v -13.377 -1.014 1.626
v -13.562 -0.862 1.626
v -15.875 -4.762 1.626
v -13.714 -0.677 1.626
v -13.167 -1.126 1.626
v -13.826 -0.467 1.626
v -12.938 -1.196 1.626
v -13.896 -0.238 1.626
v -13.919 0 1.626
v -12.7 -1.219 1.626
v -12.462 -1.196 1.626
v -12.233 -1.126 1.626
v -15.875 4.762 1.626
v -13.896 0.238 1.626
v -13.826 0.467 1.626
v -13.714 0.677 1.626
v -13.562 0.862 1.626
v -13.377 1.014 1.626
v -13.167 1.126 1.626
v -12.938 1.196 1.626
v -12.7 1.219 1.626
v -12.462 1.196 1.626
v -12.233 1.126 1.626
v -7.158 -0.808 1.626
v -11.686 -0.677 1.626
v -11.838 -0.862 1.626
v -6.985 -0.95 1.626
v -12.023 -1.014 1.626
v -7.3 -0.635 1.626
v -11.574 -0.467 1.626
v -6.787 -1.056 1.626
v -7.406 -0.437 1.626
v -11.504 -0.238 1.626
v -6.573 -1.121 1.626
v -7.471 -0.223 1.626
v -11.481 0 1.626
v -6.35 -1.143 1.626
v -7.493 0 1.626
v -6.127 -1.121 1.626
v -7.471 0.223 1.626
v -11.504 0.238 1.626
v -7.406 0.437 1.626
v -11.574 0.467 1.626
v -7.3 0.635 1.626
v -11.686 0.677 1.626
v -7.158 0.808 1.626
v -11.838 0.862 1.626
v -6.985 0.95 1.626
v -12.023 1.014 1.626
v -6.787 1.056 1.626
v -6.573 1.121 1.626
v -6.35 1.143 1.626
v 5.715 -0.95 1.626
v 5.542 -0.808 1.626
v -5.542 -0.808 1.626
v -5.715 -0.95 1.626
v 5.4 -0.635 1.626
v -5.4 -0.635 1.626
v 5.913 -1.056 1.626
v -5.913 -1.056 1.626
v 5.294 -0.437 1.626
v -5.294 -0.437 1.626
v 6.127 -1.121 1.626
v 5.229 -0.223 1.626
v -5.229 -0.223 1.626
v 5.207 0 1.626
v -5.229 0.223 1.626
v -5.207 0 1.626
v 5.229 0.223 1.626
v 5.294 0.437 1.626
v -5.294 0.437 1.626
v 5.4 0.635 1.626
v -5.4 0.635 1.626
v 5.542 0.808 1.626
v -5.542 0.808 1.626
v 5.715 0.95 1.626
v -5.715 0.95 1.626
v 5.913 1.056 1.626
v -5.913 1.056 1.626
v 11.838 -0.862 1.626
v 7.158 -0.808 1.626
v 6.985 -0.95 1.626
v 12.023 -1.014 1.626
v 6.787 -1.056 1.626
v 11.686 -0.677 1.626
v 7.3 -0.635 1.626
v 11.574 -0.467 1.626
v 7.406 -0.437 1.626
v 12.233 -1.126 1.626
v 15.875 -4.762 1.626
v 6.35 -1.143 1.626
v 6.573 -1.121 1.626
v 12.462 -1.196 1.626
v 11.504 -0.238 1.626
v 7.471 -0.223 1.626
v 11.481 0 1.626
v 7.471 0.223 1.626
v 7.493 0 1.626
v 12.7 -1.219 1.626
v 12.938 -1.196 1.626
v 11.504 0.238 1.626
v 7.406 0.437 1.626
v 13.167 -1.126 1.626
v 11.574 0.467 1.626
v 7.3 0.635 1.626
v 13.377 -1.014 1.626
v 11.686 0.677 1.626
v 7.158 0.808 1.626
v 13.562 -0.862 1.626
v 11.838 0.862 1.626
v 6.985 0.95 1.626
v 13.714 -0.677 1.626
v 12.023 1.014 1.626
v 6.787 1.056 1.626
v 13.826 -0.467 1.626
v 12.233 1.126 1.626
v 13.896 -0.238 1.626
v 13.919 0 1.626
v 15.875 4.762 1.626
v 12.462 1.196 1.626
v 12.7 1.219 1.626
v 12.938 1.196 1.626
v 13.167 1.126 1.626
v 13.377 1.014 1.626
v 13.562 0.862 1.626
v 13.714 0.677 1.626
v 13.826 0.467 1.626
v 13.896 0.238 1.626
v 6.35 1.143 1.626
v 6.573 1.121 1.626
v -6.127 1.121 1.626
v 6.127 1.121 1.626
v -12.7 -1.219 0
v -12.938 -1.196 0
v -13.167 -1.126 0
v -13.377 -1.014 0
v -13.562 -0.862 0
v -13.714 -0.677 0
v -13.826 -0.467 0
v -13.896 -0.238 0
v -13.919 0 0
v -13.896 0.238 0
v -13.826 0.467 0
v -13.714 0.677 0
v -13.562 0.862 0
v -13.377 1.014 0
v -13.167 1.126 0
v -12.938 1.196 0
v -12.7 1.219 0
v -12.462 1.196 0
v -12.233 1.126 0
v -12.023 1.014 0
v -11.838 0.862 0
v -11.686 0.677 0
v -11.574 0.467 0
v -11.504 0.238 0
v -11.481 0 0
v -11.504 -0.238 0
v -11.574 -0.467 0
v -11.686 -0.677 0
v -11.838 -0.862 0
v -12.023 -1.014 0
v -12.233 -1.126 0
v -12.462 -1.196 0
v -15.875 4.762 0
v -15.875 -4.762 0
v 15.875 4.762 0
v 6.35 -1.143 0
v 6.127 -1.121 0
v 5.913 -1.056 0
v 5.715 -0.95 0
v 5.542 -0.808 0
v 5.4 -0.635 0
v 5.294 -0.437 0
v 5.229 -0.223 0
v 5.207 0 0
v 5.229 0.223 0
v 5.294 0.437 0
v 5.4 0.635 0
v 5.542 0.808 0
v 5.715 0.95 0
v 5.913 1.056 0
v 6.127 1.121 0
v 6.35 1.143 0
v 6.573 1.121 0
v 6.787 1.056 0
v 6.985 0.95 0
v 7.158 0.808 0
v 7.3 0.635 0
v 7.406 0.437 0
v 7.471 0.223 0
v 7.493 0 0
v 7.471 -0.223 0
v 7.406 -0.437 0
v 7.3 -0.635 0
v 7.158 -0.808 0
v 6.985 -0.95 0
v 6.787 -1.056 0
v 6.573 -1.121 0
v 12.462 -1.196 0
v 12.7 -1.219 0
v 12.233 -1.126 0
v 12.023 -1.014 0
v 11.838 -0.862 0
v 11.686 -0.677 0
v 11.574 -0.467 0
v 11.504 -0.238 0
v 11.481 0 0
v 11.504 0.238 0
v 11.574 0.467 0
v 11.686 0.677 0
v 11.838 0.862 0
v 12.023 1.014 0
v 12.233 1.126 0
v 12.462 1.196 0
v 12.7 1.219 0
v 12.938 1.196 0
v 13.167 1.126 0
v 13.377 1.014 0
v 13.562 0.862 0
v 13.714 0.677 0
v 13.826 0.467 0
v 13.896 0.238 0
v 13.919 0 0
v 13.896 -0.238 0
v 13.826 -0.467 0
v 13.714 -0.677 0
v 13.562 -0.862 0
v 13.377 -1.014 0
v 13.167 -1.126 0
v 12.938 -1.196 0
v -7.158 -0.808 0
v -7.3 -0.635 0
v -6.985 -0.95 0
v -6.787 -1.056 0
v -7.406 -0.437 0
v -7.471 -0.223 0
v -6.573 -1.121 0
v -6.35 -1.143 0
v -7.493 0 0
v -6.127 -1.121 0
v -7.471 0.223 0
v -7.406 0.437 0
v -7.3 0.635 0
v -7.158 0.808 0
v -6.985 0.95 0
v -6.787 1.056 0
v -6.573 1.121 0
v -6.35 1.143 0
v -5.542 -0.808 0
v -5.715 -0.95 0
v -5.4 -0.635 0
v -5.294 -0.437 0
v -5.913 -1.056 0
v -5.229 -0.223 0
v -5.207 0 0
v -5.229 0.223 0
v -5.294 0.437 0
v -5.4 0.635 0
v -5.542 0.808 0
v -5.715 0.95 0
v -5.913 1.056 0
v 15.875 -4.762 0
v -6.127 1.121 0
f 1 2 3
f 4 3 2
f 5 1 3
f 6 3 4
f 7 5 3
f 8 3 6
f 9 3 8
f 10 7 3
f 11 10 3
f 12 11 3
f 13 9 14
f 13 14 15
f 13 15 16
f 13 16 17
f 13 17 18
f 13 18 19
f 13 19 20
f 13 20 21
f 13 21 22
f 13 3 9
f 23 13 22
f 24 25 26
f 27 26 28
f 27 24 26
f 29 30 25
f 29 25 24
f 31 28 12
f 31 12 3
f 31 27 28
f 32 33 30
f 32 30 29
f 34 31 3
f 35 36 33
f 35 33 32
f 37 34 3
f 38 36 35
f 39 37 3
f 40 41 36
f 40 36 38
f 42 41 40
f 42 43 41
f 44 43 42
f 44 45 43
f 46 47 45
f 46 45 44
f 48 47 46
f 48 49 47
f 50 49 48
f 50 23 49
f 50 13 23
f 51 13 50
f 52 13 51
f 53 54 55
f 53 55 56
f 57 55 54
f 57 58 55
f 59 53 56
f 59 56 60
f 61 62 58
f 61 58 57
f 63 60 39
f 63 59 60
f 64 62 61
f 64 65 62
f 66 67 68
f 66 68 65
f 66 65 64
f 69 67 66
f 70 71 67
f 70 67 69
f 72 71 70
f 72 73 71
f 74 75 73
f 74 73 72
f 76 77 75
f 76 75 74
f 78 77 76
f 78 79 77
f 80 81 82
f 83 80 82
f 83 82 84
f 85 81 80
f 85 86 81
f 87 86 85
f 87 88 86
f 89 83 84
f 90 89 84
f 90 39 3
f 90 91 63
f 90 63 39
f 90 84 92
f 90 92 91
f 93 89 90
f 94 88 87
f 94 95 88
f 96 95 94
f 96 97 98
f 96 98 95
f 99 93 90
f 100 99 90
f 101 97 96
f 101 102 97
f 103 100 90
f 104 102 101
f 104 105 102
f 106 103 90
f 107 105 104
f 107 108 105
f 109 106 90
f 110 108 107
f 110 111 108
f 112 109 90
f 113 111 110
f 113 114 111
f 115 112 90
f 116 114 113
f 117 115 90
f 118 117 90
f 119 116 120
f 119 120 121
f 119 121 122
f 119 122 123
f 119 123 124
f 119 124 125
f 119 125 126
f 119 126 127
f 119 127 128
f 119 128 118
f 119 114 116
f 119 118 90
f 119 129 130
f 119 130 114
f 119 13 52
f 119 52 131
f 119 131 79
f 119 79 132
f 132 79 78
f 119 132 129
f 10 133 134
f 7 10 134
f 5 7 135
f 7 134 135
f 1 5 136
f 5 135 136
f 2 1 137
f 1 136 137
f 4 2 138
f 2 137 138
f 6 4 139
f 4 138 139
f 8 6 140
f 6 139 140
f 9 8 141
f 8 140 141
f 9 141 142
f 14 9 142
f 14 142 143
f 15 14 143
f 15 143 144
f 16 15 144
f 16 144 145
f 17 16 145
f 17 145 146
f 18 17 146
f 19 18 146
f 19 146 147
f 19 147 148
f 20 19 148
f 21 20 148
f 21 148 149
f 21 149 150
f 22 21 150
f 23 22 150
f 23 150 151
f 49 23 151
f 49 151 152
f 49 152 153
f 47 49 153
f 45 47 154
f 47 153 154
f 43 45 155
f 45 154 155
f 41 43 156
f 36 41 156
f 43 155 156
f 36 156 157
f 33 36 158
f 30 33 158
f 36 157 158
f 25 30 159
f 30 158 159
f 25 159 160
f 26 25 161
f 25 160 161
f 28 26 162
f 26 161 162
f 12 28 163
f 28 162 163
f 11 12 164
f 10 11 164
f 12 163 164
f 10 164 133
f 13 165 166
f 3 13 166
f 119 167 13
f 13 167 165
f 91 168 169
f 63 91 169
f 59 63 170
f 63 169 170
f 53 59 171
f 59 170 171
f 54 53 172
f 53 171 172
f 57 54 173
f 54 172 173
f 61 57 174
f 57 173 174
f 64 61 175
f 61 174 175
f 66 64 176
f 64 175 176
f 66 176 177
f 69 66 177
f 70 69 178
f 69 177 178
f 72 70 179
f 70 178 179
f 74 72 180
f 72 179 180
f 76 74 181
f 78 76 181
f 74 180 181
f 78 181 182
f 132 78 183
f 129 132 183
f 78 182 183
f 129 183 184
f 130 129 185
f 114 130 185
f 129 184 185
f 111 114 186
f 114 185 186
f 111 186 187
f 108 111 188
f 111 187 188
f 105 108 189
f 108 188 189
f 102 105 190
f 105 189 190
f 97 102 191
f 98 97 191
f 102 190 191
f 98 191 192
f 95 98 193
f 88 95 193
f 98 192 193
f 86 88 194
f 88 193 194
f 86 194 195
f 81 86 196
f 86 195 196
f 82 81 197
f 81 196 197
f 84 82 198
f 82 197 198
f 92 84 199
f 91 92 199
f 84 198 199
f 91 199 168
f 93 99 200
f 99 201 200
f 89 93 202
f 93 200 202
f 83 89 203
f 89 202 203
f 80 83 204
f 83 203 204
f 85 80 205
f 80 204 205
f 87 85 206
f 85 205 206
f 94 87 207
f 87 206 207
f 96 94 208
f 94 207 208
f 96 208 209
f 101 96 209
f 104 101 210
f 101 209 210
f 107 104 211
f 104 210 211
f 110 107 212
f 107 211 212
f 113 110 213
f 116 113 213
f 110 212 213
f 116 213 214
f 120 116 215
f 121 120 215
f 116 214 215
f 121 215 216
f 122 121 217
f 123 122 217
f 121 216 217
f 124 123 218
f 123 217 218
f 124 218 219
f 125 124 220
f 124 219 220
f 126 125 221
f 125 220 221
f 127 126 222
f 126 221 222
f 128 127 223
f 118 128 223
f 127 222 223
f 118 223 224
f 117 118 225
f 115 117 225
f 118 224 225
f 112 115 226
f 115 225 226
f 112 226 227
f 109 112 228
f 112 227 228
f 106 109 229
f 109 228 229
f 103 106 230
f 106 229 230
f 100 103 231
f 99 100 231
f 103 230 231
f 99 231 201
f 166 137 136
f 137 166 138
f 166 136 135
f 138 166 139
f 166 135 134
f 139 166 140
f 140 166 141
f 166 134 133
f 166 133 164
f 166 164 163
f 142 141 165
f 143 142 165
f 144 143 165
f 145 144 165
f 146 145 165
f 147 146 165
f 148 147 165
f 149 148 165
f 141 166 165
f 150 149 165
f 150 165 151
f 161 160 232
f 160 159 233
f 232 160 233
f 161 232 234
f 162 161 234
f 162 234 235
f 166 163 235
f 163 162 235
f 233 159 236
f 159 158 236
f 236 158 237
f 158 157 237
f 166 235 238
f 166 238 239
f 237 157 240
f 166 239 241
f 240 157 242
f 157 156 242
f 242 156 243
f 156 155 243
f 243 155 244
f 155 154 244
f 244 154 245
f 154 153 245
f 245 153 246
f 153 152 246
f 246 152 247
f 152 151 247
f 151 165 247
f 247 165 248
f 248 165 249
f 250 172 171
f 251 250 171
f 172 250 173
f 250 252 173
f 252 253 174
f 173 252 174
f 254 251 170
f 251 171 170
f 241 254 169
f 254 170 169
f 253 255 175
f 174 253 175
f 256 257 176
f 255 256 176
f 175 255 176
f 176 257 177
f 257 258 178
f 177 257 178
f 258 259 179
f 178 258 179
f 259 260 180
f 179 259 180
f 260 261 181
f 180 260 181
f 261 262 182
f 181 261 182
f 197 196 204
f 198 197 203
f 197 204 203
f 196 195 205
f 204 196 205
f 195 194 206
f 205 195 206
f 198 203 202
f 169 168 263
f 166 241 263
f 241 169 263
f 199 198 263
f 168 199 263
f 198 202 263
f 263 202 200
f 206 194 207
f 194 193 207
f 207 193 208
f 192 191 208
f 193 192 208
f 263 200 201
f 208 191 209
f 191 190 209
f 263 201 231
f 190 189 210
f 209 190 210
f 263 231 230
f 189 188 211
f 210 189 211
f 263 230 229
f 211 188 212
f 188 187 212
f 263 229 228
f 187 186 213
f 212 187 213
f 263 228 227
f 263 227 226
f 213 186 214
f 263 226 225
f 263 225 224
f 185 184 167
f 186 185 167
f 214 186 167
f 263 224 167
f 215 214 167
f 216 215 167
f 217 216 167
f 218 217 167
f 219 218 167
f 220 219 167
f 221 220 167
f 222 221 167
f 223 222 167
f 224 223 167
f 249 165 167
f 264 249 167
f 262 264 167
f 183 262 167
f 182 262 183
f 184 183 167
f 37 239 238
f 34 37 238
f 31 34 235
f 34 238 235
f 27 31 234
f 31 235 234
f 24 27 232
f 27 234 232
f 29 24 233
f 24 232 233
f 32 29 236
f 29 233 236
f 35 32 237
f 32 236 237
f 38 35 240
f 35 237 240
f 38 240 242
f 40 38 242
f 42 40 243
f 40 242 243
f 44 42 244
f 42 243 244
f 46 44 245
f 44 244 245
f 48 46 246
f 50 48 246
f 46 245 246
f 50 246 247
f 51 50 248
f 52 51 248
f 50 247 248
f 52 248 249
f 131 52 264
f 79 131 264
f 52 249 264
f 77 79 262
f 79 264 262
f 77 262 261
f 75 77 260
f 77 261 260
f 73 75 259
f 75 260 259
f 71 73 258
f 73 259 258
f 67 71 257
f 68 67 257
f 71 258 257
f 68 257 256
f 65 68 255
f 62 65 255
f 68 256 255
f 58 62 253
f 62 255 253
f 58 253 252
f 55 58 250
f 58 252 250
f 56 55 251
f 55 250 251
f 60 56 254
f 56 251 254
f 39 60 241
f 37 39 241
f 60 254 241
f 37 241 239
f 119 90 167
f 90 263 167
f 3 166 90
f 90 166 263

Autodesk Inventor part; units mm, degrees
ref_plane "YZ Plane" through (0, 0, 0) normal (1, 0, 0) x (0, 1, 0)
ref_plane "XZ Plane" through (0, 0, 0) normal (0, 1, 0) x (-1, 0, 0)
ref_plane "XY Plane" through (0, 0, 0) normal (0, 0, 1) x (1, 0, 0)
sketch "Sketch1" plane through (0, 0, 0) normal (0, 0, 1) x (1, 0, 0)
  line L0 (-15.875, -4.7625) -> (15.875, -4.7625)
  line L1 (15.875, -4.7625) -> (15.875, 4.7625)
  line L2 (15.875, 4.7625) -> (-15.875, 4.7625)
  line L3 (-15.875, 4.7625) -> (-15.875, -4.7625)
  line L4 (-15.875, -4.7625) -> (15.875, 4.7625) construction
  point P0 (0, 0)
  point P1 (0, 0)
  dimension "d0" = 9.525
  dimension "d1" = 31.75
extrude "Extrusion1" add sketch "Sketch1" along normal blind 1.6256
sketch "Sketch2" plane through (0, 0, 1.6256) normal (0, 0, 1) x (1, 0, 0)
  line L0 (-22.225, 0) -> (22.225, 0) construction
  line L1 (0, -6.6675) -> (0, 6.6675) construction
  point P0 (0, 0)
  point P1 (-12.7, 0)
  point P2 (12.7, 0)
  dimension "d4" = 25.4
hole "Hole1" at (-12.7, 0, 1.6256) at (12.7, 0, 1.6256) direction (0, 0, -1) diameter 2.4384 end through all clearance for "Flat Head Machine Screw (82)" size "#2" standard "Ansi Unified Screw Threads"
sketch "Sketch3" plane through (0, 0, 1.6256) normal (0, 0, 1) x (1, 0, 0)
  line L0 (-22.225, 0) -> (22.225, 0) construction
  line L1 (0, -6.6675) -> (0, 6.6675) construction
  point P0 (0, 0)
  point P1 (-6.35, 0)
  point P2 (6.35, 0)
  dimension "d12" = 12.7
hole "Hole2" at (-6.35, 0, 1.6256) at (6.35, 0, 1.6256) direction (0, 0, -1) diameter 2.286 end through all
properties part number "J002609"
